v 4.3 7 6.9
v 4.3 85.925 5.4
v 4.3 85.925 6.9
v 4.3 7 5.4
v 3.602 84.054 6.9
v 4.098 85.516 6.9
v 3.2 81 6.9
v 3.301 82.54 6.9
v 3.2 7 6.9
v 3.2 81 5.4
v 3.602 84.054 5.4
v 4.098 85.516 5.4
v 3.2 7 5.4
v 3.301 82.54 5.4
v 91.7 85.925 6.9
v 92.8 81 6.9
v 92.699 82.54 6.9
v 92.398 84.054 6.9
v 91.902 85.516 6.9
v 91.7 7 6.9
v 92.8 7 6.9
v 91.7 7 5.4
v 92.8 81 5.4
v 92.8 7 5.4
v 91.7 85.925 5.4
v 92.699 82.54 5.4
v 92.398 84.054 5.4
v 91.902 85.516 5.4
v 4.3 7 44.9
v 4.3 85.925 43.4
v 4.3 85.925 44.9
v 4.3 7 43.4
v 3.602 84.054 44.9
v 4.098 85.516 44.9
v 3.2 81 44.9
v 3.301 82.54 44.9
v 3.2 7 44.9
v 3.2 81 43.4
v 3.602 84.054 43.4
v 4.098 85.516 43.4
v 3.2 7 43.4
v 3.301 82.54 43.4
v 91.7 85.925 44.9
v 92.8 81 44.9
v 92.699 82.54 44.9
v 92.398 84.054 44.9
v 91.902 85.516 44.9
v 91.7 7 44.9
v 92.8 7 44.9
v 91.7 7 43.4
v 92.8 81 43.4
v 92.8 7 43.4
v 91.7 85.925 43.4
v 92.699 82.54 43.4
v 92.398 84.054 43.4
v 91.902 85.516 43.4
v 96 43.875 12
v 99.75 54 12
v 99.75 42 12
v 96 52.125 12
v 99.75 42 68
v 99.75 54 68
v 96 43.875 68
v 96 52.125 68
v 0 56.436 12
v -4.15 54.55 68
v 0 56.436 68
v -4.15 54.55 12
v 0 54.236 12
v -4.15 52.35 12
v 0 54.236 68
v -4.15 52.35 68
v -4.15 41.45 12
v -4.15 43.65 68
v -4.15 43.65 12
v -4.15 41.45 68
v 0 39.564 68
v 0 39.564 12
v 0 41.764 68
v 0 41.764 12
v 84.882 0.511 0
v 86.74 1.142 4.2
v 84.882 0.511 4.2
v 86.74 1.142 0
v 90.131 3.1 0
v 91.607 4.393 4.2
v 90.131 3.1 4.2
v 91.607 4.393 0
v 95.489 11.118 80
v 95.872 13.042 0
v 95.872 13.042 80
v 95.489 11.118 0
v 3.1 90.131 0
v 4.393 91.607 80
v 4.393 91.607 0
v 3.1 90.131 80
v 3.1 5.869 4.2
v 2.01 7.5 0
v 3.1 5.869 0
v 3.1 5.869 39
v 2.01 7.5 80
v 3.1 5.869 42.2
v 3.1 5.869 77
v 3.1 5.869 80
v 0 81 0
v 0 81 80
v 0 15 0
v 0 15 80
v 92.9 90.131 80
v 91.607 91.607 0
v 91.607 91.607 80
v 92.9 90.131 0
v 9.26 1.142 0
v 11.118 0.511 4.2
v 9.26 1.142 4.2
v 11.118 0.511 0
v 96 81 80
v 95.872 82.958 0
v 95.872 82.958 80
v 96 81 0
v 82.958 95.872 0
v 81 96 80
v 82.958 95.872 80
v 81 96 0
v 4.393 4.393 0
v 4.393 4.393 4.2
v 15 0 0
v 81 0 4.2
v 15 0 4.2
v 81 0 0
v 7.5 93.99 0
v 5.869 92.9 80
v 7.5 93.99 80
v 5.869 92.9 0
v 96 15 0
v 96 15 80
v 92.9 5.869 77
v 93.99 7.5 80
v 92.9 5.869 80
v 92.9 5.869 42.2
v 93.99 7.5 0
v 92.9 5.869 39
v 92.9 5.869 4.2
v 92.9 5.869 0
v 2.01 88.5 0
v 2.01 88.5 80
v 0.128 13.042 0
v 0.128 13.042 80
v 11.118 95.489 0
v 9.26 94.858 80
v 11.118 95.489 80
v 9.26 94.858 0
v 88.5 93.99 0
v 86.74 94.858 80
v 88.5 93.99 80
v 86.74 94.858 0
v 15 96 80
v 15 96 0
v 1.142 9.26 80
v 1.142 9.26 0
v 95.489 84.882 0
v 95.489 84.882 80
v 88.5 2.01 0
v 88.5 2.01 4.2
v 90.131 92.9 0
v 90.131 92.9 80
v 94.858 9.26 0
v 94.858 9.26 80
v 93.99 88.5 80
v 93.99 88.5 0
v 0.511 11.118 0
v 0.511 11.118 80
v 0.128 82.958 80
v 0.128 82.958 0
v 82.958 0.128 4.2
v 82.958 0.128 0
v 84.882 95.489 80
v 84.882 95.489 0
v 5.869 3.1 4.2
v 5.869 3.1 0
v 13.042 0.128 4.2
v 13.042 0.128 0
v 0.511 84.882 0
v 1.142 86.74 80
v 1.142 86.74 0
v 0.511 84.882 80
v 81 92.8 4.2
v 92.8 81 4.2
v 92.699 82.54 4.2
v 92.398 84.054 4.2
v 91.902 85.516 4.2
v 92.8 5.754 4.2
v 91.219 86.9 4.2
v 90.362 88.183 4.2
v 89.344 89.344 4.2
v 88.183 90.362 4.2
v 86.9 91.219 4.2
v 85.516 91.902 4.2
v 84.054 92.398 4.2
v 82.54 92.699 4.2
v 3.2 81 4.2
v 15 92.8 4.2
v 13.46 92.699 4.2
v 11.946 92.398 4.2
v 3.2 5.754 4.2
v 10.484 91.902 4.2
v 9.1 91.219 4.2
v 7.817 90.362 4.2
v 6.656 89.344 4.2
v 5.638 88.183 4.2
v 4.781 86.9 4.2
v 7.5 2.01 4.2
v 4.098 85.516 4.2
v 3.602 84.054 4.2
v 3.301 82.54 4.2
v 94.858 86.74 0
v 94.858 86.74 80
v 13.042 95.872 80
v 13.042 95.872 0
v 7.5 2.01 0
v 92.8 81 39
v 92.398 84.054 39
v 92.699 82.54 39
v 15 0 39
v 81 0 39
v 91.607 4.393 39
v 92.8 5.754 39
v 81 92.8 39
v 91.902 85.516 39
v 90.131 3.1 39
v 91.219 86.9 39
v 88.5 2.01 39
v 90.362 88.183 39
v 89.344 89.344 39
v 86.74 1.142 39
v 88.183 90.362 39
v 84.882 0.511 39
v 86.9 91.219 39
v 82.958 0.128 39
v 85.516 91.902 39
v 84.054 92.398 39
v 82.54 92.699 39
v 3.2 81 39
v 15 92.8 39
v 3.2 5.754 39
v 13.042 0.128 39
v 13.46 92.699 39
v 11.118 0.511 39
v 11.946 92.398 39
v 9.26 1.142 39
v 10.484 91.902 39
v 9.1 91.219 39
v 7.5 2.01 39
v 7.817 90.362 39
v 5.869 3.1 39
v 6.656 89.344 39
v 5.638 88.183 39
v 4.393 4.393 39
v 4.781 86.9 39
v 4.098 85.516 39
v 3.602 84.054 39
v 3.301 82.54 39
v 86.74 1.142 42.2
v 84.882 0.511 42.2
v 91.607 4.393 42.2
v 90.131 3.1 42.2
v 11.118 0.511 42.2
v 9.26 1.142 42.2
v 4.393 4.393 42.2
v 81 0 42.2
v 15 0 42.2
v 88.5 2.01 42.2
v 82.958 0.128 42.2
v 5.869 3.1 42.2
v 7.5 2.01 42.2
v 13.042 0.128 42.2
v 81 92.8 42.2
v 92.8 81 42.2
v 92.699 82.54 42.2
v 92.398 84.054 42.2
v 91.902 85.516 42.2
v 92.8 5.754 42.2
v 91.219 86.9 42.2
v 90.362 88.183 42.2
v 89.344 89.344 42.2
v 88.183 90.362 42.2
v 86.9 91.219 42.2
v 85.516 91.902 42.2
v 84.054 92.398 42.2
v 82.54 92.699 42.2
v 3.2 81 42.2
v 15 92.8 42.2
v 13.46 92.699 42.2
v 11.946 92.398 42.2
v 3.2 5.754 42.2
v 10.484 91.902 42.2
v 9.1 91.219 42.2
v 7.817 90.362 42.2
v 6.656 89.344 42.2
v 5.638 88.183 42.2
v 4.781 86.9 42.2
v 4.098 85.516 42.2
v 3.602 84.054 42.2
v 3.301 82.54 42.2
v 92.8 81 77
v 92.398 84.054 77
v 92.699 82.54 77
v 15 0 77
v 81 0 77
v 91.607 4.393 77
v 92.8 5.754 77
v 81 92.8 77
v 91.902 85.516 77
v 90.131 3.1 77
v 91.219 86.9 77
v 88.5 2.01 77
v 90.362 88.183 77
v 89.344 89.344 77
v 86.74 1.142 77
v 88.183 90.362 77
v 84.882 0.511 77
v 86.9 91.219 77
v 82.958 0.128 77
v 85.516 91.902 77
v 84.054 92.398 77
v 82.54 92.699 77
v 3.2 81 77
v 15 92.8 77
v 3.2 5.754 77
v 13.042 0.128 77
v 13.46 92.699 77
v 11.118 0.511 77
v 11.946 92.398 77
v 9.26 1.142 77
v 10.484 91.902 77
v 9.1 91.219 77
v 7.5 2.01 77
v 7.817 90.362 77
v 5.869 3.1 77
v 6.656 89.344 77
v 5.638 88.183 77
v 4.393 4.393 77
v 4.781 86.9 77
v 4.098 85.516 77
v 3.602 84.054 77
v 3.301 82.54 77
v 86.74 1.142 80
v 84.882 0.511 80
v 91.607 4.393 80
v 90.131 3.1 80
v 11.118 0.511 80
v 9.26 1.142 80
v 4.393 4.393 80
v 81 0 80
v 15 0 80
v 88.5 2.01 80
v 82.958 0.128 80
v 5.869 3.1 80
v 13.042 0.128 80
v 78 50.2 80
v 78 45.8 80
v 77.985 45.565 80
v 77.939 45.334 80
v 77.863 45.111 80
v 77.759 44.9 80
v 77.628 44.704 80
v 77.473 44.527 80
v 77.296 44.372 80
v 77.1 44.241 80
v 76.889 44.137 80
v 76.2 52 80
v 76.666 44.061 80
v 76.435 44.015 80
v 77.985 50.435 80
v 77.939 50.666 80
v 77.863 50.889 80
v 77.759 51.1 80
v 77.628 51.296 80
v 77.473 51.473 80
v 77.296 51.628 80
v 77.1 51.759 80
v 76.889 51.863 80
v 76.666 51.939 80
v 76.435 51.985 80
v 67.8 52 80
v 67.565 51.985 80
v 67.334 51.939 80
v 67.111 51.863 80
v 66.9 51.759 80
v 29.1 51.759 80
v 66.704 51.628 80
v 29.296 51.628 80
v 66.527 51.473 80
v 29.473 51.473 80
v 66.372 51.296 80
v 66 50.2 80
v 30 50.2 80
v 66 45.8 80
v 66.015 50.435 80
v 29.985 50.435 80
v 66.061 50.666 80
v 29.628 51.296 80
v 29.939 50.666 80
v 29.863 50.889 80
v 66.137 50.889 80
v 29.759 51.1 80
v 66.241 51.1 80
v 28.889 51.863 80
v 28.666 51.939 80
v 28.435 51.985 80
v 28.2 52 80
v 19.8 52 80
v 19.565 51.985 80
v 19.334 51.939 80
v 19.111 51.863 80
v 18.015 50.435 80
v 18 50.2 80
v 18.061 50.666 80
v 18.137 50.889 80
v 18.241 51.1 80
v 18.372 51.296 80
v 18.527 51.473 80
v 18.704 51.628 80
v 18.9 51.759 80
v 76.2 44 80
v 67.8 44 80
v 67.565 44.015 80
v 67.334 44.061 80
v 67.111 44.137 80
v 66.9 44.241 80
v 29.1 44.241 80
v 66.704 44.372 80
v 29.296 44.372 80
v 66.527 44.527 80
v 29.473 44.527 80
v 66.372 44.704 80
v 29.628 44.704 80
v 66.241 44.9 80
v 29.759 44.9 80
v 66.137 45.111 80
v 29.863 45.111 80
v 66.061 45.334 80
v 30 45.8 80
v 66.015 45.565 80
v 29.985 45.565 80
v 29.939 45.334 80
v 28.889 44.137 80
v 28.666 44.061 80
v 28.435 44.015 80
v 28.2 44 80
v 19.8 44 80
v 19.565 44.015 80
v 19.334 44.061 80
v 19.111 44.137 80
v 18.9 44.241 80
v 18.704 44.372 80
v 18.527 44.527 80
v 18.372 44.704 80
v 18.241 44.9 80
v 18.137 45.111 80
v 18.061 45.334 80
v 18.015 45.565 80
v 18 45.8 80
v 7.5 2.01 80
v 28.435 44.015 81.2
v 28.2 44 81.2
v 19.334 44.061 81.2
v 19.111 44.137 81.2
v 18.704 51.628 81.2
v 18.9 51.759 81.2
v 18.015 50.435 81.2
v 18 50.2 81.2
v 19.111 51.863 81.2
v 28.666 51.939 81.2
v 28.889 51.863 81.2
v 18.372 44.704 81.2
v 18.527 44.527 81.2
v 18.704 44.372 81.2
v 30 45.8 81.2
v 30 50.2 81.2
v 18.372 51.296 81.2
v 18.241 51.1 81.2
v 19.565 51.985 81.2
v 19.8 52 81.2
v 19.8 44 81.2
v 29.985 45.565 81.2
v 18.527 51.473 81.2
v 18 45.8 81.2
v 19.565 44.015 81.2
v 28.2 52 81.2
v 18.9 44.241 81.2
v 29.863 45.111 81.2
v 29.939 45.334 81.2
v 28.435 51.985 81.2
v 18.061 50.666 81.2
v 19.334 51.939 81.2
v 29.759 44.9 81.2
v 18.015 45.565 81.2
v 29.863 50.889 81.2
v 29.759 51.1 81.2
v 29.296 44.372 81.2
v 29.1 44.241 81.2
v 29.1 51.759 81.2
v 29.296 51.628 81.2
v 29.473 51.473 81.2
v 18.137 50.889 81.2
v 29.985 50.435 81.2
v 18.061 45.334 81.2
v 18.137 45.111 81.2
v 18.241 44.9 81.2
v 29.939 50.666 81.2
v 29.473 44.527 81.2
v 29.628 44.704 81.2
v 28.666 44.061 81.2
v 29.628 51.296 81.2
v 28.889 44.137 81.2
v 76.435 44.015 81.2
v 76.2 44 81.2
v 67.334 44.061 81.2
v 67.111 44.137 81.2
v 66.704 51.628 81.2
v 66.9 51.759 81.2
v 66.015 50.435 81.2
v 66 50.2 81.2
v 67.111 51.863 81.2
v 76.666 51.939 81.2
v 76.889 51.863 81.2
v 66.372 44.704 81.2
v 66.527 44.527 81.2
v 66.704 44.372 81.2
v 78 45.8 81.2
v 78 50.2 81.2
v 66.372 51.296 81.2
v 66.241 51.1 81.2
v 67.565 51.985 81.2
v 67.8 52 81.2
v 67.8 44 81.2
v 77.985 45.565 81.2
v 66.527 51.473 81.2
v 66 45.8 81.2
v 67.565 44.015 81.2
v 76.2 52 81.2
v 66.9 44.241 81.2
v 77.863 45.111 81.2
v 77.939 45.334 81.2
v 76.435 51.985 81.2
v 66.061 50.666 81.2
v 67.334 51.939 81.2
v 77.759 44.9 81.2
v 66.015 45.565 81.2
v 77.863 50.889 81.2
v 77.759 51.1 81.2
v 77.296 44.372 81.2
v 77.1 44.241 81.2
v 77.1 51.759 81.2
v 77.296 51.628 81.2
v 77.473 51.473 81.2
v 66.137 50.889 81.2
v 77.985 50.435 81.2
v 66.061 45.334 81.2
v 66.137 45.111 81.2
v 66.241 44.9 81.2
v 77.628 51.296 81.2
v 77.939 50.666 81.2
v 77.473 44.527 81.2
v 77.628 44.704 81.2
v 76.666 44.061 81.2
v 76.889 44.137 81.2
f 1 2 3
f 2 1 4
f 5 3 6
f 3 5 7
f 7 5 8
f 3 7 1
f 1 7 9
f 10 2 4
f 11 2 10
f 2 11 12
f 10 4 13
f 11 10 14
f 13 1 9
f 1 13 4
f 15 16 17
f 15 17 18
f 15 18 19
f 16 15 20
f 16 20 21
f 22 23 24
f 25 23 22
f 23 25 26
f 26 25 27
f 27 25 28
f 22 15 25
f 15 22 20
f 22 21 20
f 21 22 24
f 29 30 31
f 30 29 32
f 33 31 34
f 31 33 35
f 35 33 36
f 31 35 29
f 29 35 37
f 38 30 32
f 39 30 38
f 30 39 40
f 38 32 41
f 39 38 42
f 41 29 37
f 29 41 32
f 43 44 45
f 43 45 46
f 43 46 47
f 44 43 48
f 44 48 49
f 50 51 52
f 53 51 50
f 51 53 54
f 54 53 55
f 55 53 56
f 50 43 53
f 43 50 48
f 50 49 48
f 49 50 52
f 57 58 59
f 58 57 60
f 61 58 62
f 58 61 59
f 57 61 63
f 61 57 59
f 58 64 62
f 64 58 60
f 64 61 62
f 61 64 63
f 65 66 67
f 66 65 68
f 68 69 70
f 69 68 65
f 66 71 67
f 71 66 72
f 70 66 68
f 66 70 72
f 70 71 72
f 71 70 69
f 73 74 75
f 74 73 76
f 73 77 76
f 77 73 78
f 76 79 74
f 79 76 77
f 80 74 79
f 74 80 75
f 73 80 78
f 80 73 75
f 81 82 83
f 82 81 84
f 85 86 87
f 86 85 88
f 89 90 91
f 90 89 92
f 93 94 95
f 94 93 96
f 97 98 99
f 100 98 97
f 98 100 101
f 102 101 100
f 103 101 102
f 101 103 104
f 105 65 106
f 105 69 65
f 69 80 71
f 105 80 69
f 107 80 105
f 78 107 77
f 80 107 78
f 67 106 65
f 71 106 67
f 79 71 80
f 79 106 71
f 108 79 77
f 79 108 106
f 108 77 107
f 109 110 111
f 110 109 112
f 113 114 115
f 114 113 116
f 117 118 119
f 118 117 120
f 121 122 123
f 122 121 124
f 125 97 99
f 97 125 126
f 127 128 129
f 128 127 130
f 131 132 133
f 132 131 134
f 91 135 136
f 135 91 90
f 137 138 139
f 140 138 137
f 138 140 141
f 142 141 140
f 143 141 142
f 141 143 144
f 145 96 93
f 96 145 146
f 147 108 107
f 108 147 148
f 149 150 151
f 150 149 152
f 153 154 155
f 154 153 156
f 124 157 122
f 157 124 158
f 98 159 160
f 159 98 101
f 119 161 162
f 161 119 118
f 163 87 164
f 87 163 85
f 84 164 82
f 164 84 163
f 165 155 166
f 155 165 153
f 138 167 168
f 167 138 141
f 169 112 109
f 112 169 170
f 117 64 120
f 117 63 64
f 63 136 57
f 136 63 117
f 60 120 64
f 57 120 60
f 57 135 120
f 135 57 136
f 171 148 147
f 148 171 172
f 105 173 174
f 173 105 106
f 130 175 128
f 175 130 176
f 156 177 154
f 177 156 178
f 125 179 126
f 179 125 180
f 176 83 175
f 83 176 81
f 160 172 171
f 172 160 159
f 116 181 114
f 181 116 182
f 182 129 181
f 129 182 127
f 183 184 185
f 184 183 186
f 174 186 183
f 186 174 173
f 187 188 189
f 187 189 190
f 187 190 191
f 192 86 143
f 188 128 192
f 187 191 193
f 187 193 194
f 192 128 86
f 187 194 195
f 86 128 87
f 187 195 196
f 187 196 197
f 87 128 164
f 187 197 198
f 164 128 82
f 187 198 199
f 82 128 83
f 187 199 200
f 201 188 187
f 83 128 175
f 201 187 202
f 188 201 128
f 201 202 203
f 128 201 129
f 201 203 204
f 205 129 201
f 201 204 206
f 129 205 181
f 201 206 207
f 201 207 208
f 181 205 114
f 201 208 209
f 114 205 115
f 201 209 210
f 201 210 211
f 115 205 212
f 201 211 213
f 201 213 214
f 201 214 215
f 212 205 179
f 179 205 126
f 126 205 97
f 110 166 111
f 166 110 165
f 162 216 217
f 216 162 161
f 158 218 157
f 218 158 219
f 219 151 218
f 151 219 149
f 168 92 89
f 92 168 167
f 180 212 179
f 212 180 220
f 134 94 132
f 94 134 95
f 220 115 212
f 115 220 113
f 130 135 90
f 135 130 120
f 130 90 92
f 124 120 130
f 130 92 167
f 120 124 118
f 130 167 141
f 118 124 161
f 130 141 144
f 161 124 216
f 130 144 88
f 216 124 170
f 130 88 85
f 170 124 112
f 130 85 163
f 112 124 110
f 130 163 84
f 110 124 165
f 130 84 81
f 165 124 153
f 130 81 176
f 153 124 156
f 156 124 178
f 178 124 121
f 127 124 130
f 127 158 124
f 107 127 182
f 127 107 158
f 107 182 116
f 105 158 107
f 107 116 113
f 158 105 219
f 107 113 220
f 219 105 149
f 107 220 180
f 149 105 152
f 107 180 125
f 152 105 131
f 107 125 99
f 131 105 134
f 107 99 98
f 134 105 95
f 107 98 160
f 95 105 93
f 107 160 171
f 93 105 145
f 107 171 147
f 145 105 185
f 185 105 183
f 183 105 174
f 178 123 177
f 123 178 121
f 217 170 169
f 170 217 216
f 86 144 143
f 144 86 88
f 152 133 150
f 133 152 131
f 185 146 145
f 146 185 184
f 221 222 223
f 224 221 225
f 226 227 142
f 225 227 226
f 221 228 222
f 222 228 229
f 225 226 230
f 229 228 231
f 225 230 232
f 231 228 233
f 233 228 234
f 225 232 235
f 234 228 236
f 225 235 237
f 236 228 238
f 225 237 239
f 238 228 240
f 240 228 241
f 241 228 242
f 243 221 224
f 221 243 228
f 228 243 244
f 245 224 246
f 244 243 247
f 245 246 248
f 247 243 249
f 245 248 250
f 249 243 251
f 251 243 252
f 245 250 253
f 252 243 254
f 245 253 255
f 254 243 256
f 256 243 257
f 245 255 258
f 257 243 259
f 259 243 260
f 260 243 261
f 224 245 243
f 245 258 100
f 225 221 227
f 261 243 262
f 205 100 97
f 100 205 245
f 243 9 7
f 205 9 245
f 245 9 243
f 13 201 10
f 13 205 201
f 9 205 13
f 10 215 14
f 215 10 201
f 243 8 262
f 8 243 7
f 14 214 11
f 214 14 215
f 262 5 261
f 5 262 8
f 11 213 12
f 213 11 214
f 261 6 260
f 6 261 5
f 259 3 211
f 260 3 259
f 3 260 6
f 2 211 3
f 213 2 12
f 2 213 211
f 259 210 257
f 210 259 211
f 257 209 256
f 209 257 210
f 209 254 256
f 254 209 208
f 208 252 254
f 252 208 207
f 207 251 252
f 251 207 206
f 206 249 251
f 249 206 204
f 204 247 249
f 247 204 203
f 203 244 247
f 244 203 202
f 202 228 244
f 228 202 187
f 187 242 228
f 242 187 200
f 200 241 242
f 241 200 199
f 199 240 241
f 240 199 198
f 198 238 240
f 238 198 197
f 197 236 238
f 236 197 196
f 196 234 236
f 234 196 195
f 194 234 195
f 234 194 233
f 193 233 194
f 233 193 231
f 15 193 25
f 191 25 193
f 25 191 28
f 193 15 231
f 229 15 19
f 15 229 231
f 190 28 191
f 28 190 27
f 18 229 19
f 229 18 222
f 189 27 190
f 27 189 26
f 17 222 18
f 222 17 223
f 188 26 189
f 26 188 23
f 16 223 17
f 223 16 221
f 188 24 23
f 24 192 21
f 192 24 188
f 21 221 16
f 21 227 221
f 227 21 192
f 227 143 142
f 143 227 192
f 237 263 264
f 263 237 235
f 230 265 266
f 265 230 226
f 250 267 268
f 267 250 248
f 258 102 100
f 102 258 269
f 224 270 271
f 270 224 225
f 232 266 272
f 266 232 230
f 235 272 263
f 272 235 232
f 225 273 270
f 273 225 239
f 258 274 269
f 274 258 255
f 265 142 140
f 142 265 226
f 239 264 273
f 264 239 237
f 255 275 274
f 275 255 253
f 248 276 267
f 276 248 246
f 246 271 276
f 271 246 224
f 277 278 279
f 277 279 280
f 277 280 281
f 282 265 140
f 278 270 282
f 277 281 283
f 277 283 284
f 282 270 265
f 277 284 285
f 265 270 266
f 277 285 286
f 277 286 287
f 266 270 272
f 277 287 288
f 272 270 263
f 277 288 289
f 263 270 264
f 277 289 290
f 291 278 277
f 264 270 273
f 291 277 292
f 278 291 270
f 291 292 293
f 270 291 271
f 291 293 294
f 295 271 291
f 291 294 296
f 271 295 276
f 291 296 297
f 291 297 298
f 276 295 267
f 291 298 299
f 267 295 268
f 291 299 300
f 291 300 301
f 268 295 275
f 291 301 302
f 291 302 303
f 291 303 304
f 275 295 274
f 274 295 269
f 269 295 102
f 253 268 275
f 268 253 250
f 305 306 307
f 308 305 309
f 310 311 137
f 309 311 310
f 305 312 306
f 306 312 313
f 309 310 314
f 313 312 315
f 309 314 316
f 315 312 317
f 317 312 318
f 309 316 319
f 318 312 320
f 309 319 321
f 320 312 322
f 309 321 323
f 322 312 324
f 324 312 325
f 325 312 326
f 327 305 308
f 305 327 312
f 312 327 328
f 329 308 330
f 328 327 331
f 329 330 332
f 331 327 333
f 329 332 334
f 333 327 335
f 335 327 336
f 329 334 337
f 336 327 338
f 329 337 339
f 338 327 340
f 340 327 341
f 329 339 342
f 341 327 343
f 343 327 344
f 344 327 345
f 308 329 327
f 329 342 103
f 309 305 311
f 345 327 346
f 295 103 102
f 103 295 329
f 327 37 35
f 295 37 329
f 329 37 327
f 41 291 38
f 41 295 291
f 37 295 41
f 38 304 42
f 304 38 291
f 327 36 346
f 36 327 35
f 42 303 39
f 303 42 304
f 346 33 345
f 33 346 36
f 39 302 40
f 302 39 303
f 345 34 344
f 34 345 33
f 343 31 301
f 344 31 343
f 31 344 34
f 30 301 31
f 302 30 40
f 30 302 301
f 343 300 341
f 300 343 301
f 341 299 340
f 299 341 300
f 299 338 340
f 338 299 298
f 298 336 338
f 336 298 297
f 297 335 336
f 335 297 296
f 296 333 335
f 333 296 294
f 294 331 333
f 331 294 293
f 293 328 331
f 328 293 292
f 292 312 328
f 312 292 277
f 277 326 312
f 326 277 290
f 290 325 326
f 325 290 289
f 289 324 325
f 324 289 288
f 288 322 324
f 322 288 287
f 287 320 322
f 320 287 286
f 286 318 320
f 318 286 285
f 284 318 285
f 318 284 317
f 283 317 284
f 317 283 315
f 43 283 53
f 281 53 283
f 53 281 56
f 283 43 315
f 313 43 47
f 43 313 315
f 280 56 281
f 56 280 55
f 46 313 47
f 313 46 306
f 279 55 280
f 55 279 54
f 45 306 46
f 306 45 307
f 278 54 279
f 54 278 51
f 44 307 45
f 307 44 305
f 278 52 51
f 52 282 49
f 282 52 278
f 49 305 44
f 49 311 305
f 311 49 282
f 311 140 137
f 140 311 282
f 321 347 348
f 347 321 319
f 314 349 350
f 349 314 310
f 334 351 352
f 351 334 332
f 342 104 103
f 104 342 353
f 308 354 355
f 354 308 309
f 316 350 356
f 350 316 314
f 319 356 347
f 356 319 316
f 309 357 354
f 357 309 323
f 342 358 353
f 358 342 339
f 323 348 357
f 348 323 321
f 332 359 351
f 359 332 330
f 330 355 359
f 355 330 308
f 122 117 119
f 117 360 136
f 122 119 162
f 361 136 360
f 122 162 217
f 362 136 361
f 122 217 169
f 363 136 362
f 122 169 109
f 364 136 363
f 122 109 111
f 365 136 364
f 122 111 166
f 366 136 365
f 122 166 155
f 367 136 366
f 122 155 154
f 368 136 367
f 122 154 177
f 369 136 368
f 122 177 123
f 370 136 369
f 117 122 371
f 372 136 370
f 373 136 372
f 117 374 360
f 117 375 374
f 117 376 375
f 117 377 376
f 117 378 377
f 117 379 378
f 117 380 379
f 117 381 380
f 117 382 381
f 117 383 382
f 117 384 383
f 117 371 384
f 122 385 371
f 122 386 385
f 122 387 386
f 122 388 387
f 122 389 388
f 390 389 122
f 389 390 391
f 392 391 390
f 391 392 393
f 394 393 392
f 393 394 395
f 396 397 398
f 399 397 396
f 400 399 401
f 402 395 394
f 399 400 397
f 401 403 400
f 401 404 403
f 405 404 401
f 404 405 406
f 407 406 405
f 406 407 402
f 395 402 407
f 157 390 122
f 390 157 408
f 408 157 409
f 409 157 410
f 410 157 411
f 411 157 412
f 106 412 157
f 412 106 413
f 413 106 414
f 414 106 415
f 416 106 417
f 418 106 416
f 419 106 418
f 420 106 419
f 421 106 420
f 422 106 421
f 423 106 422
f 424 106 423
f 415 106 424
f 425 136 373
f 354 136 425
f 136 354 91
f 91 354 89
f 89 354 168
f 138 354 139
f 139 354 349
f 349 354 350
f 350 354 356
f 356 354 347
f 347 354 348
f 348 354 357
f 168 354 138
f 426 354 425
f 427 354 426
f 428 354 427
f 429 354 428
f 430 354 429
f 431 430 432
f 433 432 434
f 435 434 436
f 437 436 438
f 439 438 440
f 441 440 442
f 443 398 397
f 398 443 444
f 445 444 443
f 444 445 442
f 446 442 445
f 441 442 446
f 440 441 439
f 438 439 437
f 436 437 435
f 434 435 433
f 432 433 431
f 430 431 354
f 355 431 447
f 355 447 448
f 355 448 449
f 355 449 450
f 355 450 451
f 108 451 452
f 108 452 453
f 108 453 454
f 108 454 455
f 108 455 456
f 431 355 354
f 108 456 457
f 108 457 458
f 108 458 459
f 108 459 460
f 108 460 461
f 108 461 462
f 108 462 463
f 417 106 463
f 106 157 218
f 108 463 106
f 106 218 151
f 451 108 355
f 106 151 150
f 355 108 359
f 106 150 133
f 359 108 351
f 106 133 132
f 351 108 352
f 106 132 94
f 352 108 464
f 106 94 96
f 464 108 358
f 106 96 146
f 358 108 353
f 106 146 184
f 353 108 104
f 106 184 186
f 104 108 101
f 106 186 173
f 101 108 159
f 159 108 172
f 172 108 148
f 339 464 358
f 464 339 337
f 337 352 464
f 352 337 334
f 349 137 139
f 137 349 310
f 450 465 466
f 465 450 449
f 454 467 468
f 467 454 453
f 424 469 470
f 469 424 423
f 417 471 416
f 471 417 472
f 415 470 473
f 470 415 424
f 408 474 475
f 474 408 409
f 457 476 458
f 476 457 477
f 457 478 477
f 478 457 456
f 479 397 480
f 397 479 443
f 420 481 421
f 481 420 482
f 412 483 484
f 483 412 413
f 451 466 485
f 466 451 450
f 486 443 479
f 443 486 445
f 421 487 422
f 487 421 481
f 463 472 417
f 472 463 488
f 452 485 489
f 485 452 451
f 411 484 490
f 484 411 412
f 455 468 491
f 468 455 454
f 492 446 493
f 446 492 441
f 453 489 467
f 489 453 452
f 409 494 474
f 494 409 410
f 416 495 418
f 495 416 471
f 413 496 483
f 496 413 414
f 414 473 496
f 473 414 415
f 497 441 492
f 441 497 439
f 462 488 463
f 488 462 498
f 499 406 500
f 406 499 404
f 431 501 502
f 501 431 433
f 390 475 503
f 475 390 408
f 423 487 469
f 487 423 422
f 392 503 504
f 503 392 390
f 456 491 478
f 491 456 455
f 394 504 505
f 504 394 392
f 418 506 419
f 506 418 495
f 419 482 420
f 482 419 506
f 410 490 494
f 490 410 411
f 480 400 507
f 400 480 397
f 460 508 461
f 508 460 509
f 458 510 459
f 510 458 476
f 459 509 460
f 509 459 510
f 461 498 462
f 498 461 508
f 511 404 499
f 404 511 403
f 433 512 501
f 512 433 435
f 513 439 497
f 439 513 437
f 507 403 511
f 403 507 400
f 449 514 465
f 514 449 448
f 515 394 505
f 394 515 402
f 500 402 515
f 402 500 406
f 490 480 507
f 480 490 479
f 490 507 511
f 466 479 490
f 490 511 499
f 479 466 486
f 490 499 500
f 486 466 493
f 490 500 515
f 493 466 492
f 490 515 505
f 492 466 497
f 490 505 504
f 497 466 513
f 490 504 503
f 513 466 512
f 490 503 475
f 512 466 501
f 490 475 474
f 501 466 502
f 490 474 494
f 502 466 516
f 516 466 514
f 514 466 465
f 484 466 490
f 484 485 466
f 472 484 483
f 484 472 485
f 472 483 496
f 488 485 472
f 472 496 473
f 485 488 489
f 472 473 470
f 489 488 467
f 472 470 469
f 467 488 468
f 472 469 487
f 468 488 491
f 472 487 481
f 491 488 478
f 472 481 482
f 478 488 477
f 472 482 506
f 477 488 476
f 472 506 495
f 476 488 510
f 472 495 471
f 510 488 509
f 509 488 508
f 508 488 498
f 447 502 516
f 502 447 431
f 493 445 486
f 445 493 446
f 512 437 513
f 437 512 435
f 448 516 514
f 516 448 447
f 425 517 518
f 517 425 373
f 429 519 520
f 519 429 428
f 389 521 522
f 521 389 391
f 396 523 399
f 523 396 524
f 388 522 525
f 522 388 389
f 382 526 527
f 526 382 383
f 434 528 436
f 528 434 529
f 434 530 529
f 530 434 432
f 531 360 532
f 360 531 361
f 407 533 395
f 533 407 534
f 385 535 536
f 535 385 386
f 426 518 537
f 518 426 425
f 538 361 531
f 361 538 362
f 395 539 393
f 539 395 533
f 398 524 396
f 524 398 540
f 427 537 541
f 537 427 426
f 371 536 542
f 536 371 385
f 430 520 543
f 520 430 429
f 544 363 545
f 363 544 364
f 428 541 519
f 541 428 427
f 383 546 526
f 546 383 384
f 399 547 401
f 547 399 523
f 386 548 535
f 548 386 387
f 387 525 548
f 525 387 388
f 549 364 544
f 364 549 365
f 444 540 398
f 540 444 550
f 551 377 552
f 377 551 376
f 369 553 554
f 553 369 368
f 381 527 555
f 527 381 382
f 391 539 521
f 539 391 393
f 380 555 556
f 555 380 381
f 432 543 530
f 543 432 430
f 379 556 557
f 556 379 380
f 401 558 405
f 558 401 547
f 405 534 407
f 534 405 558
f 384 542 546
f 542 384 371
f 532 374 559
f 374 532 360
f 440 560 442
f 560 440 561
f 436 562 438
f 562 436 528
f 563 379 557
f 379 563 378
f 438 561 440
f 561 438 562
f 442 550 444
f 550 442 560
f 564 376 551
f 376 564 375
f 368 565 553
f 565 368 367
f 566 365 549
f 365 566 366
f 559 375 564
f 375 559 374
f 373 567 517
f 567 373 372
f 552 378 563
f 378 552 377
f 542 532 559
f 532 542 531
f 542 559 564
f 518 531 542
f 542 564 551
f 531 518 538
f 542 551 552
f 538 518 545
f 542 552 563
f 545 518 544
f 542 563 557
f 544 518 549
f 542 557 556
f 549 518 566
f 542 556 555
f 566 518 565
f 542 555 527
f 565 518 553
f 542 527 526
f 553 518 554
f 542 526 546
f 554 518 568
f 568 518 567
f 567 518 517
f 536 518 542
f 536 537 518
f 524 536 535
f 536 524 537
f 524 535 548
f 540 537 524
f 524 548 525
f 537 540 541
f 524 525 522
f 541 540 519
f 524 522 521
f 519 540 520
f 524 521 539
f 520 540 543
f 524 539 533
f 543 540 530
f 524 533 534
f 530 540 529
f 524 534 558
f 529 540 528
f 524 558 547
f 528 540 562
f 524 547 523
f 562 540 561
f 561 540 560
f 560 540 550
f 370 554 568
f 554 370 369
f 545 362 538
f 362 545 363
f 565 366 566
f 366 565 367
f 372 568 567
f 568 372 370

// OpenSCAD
// Modular Desk Organizer - parametric OpenSCAD source
// Inspired by the generated concept image: soft rounded forms, subtle ribs,
// drawer tower, cubby, open trays and vertical slide-dovetail connections.
// Units: mm

$fn = 48;
// Select exactly one part for STL export.
// Available parts:
PART = "drawer_housing";  // Schubladen-Gehäuse
//   PART = "drawer_1";        // Schublade 1
//   PART = "drawer_2";        // Schublade 2 (identische Geometrie)
//   PART = "drawer_pair";     // beide Schubladen nebeneinander
//   PART = "cubby";           // offenes Ablagefach
//   PART = "shallow_tray";    // flache Ablageschale / Top-Tray
//   PART = "divided_bin";     // unterteiltes Bin / Organizerfach
//   PART = "pen_cup";         // hoher Stiftehalter
//   PART = "connector_test";  // Steckverbinder-Testteil
//   PART = "layout";          // komplette Vorschau
//
// Intuitive aliases also work:
//   "housing", "drawer", "ablage", "tray", "bin", "pen_holder"
//PART = "layout";
FIT = 0.35;               // connector clearance per side; try 0.25..0.45 depending on printer/material
TEXTURE = false;          // avoid overlapping ribs when image engraving is enabled

// Optional image-based engraving texture.
// Use a grayscale PNG/JPG heightmap-like image. With invert=true, dark areas
// engrave deeper and white areas engrave shallower (OpenSCAD surface convention).
// when IMAGE_TEXTURE_INVERT = true. For a cleaner result on flat panels you
// will often want TEXTURE = false when using this image engraving.
IMAGE_TEXTURE_ENABLE = true;
IMAGE_TEXTURE_FILE = "carbon_fiber_heightmap_drawer_213x67.png";   // 0.4 mm physical sampling
IMAGE_TEXTURE_INVERT = true;
IMAGE_TEXTURE_DEPTH = 0.6;       // engraving depth in mm
IMAGE_TEXTURE_TOP_CLEAR = 4;     // keep this much free at the top
IMAGE_TEXTURE_BOTTOM_CLEAR = 4;  // keep this much free at the bottom
IMAGE_TEXTURE_FRONT_MARGIN = 2;  // free border on front panels (left/right)
IMAGE_TEXTURE_SIDE_MARGIN = 3;   // free border on side panels (front/back)

module rr2d(w,d,r) {
    translate([r,r]) offset(r=r) square([w-2*r,d-2*r], center=false);
}

module rounded_prism(w,d,h,r) {
    linear_extrude(height=h) rr2d(w,d,r);
}

module cup(w,d,h,wall=3,bottom=3,r=12) {
    difference() {
        rounded_prism(w,d,h,r);
        translate([wall,wall,bottom])
            rounded_prism(w-2*wall,d-2*wall,h-bottom+0.2,max(1,r-wall));
    }
}

// A rounded cup rotated so its opening points toward the front (negative Y / Y=0 side).
module front_cup(w,d,h,wall=3.2,back=3.2,r=12) {
    translate([0,d,0]) rotate([90,0,0]) cup(w,h,d,wall,back,r);
}

module u_shell_2d(w,d,r,wall=3.2,back=3.2) {
    // Rounded outer footprint with a fully open, straight front.
    // The cavity follows the rear corner radius instead of cutting a
    // rectangular notch through the rounded back corners.
    inner_w = w - 2*wall;
    inner_d = d - back;
    inner_r = max(1, r - wall);

    difference() {
        rr2d(w,d,r);
        union() {
            // Main inner cavity with matching rear radii.
            translate([wall,0]) rr2d(inner_w,inner_d,inner_r);
            // Square off only the FRONT corners so the drawers still slide
            // straight in from y=0. Rear corners remain rounded/closed.
            translate([wall,-0.2])
                square([inner_w,inner_r+0.2], center=false);
        }
    }
}

module u_shell_layer(w,d,h,r,wall=3.2,back=3.2) {
    linear_extrude(height=h) u_shell_2d(w,d,r,wall,back);
}

module connector_pair(w,d,h,fit=FIT,rail_h=56,rail_z=12,p=4,base=8,head=12,rail_t=2.2) {
    overlap = 0.25;
    y0 = d/2;
    zh = min(rail_h,h-rail_z-5);

    // Male vertical dovetail on RIGHT: narrow at body, wider at head.
    translate([0,0,rail_z]) linear_extrude(height=zh)
        polygon(points=[
            [w-overlap,y0-base/2],
            [w+p-overlap,y0-head/2],
            [w+p-overlap,y0+head/2],
            [w-overlap,y0+base/2]
        ]);

    // Female receiver on LEFT is external, so no hidden support-heavy groove is required.
    mouth = base + 2*fit;
    inner = head + 2*fit;
    translate([0,0,rail_z]) linear_extrude(height=zh)
        polygon(points=[
            [-p-0.15,y0+mouth/2],
            [overlap,y0+inner/2],
            [overlap,y0+inner/2+rail_t],
            [-p-0.15,y0+mouth/2+rail_t]
        ]);
    translate([0,0,rail_z]) linear_extrude(height=zh)
        polygon(points=[
            [-p-0.15,y0-mouth/2-rail_t],
            [overlap,y0-inner/2-rail_t],
            [overlap,y0-inner/2],
            [-p-0.15,y0-mouth/2]
        ]);
}

module rib_ring(w,d,r,z,amp=0.38,rib_h=0.75) {
    translate([0,0,z]) difference() {
        translate([-amp,-amp,0])
            linear_extrude(height=rib_h) rr2d(w+2*amp,d+2*amp,r+amp);
        translate([0,0,-0.1])
            linear_extrude(height=rib_h+0.2) rr2d(w,d,r);
    }
}

module mount_key(w=12,d=8,h=1.2,r=1.8) {
    rounded_prism(w,d,h,r);
}


module image_texture_heightmap(panel_w, panel_h, depth) {
    resize([panel_w, panel_h, depth], auto=[false,false,false])
        surface(file=IMAGE_TEXTURE_FILE,
                center=false,
                invert=IMAGE_TEXTURE_INVERT,
                convexity=8);
}

module engrave_front_panel(x0, y_plane, z0, panel_w, panel_h, depth) {
    translate([x0, y_plane, z0 + panel_h])
        rotate([-90,0,0])
            image_texture_heightmap(panel_w, panel_h, depth);
}

module engrave_left_side(x_plane, y0, z0, panel_w, panel_h, depth) {
    translate([x_plane, y0, z0])
        rotate([0,0,90])
            rotate([90,0,0])
                image_texture_heightmap(panel_w, panel_h, depth);
}

module engrave_right_side(x_plane, y0, z0, panel_w, panel_h, depth) {
    translate([x_plane, y0, z0])
        mirror([1,0,0])
            rotate([0,0,90])
                rotate([90,0,0])
                    image_texture_heightmap(panel_w, panel_h, depth);
}

module apply_image_engraving(x0, y0, z0, w, d, h, front=true, sides=true, front_plane_y=0) {
    panel_h = h - IMAGE_TEXTURE_TOP_CLEAR - IMAGE_TEXTURE_BOTTOM_CLEAR;
    front_w = w - 2*IMAGE_TEXTURE_FRONT_MARGIN;
    side_w = d - 2*IMAGE_TEXTURE_SIDE_MARGIN;

    if (!IMAGE_TEXTURE_ENABLE || panel_h <= 0)
        children();
    else
        difference() {
            children();

            if (front && front_w > 0)
                engrave_front_panel(
                    x0 + IMAGE_TEXTURE_FRONT_MARGIN,
                    front_plane_y,
                    z0 + IMAGE_TEXTURE_BOTTOM_CLEAR,
                    front_w,
                    panel_h,
                    IMAGE_TEXTURE_DEPTH
                );

            if (sides && side_w > 0) {
                engrave_left_side(
                    x0,
                    y0 + IMAGE_TEXTURE_SIDE_MARGIN,
                    z0 + IMAGE_TEXTURE_BOTTOM_CLEAR,
                    side_w,
                    panel_h,
                    IMAGE_TEXTURE_DEPTH
                );
                engrave_right_side(
                    x0 + w,
                    y0 + IMAGE_TEXTURE_SIDE_MARGIN,
                    z0 + IMAGE_TEXTURE_BOTTOM_CLEAR,
                    side_w,
                    panel_h,
                    IMAGE_TEXTURE_DEPTH
                );
            }
        }
}

module drawer_housing() {
    // Built from z-layers so the cavity geometry matches the exported STL.
    // No front engraving here because the front is interrupted by the drawer
    // openings. Side engraving remains available.
    w=96; d=96; h=80; wall=3.2; back=3.2; r=15; shelf=3.2;
    open_h = 34.8;
    lower_z = 4.2;
    upper_z = lower_z + open_h + shelf;
    key_w = 12; key_d = 8; key_h = 1.2; key_r = 1.8;
    key_x1 = 18; key_x2 = w-18-key_w; key_y = (d-key_d)/2;
    apply_image_engraving(0,0,0,w,d,h,front=false,sides=false) {
        union() {
            translate([0,0,0]) rounded_prism(w,d,lower_z,r);
            translate([0,0,lower_z]) u_shell_layer(w,d,open_h,r,wall,back);
            translate([0,0,lower_z+open_h]) rounded_prism(w,d,shelf,r);
            translate([0,0,upper_z]) u_shell_layer(w,d,open_h,r,wall,back);
            translate([0,0,upper_z+open_h]) rounded_prism(w,d,h-(upper_z+open_h),r);
            // shallow runners for the drawers
            for (z=[lower_z+1.2, upper_z+1.2]) {
                translate([wall-0.3,7,z]) cube([1.4,d-back-10,1.5]);
                translate([w-wall-1.1,7,z]) cube([1.4,d-back-10,1.5]);
            }
            // subtle top docking keys for the shallow tray
            translate([key_x1,key_y,h]) mount_key(key_w,key_d,key_h,key_r);
            translate([key_x2,key_y,h]) mount_key(key_w,key_d,key_h,key_r);
            connector_pair(w,d,h);
        }
    }
}

module drawer() {
    // Image engraving can be applied to the front face and both outer sides.
    body_w=88.6; body_d=91; body_h=32.2; body_r=10.0;
    face_w=89.1; face_h=34.6; face_t=2.4; face_r=11.2;
    x0 = -(face_w-body_w)/2;
    y0 = -face_t;
    total_d = body_d + face_t;
    union() {
        apply_image_engraving(x0,y0,0,face_w,total_d,face_h,front=true,sides=true,front_plane_y=y0) {
            union() {
                cup(body_w,body_d,body_h,2.4,2.4,body_r);
                // front bezel with radii visually matched to the housing opening
                translate([x0,-face_t,0])
                    rounded_prism(face_w,face_t,face_h,face_r);
            }
        }
        // Keep the pull outside the heightmap Boolean so it cannot fragment.
        translate([(body_w-30)/2,-4.2,9.7]) rounded_prism(30,5.5,6.2,2.4);
    }
}

module cubby() {
    w=96; d=96; h=80;
    // Front remains unengraved because it is largely open.
    apply_image_engraving(0,0,0,w,d,h,front=false,sides=false) {
        union() {
            front_cup(w,d,h,3.2,3.2,13);
            connector_pair(w,d,h);
        }
    }
}

module shallow_tray() {
    // Optional top-docking tray for the drawer housing.
    // Matching sockets on the underside fit over the housing's low-profile keys.
    w=96; d=96; h=26; r=14;
    key_w = 12; key_d = 8; key_h = 1.2; key_r = 1.8; fit = 0.25;
    key_x1 = 18; key_x2 = w-18-key_w; key_y = (d-key_d)/2;
    apply_image_engraving(0,0,0,w,d,h,front=true,sides=false) {
        difference() {
            union() {
                cup(w,d,h,3,3,r);
                translate([46.5,3.2,3]) cube([2.4,d-6.4,15.5]);
                connector_pair(w,d,h,rail_h=14,rail_z=6);
            }
            // hidden underside sockets for top mounting on the drawer housing
            translate([key_x1-fit,key_y-fit,0])
                mount_key(key_w+2*fit,key_d+2*fit,key_h+0.35,key_r+fit);
            translate([key_x2-fit,key_y-fit,0])
                mount_key(key_w+2*fit,key_d+2*fit,key_h+0.35,key_r+fit);
        }
    }
}

module divided_bin() {
    w=96; d=96; h=78; r=15;
    apply_image_engraving(0,0,0,w,d,h,front=true,sides=false) {
        union() {
            cup(w,d,h,3,3,r);
            translate([46.7,3,3]) cube([2.6,d-6,57]);
            translate([3,47,3]) cube([43.7,2.6,57]);
            translate([49.3,58,3]) cube([43.7,2.6,57]);
            connector_pair(w,d,h);
            if (TEXTURE) for (z=[10:5.5:60]) rib_ring(w,d,r,z);
        }
    }
}

module pen_cup() {
    w=64; d=96; h=110; r=17;
    apply_image_engraving(0,0,0,w,d,h,front=true,sides=false) {
        union() {
            cup(w,d,h,3,3,r);
            translate([3,50,3]) cube([w-6,2.6,87]);
            connector_pair(w,d,h,rail_h=56,rail_z=12);
            if (TEXTURE) for (z=[10:5.5:79]) rib_ring(w,d,r,z);
        }
    }
}

module connector_test() {
    // Print two copies and slide them together vertically.
    w=24; d=34; h=30;
    union() {
        cube([w,d,h]);
        connector_pair(w,d,h,rail_h=20,rail_z=5);
    }
}

module layout() {
    gap = 4.35;  // natural spacing produced by the external sliding connector
    // back row
    translate([0,0,0]) drawer_housing();
    translate([96+gap,0,0]) divided_bin();
    translate([2*(96+gap),0,0]) cubby();
    translate([3*(96+gap),0,0]) pen_cup();

    // drawers shown partially inserted for a useful preview
    translate([(96-88.6)/2,-5,4.2]) drawer();
    translate([(96-88.6)/2,-10,43.1]) drawer();

    // extra shallow tray nearby
    translate([96+gap,-115,0]) shallow_tray();
}

// ---------------------------------------------------------------------------
// Export selector
// ---------------------------------------------------------------------------
// For individual STL files set PART above, press F6, then:
// File -> Export -> Export as STL
//
// The two drawers are intentionally identical. "drawer_1" and "drawer_2"
// therefore export the same geometry, allowing you to save them under two
// separate filenames if desired.

if (PART == "drawer_housing" || PART == "housing") drawer_housing();
else if (PART == "drawer" || PART == "drawer_1") drawer();
else if (PART == "drawer_2") drawer();
else if (PART == "drawer_pair") {
    drawer();
    translate([98,0,0]) drawer();
}
else if (PART == "cubby" || PART == "ablage") cubby();
else if (PART == "shallow_tray" || PART == "tray") shallow_tray();
else if (PART == "divided_bin" || PART == "bin") divided_bin();
else if (PART == "pen_cup" || PART == "pen_holder") pen_cup();
else if (PART == "connector_test") connector_test();
else layout();
